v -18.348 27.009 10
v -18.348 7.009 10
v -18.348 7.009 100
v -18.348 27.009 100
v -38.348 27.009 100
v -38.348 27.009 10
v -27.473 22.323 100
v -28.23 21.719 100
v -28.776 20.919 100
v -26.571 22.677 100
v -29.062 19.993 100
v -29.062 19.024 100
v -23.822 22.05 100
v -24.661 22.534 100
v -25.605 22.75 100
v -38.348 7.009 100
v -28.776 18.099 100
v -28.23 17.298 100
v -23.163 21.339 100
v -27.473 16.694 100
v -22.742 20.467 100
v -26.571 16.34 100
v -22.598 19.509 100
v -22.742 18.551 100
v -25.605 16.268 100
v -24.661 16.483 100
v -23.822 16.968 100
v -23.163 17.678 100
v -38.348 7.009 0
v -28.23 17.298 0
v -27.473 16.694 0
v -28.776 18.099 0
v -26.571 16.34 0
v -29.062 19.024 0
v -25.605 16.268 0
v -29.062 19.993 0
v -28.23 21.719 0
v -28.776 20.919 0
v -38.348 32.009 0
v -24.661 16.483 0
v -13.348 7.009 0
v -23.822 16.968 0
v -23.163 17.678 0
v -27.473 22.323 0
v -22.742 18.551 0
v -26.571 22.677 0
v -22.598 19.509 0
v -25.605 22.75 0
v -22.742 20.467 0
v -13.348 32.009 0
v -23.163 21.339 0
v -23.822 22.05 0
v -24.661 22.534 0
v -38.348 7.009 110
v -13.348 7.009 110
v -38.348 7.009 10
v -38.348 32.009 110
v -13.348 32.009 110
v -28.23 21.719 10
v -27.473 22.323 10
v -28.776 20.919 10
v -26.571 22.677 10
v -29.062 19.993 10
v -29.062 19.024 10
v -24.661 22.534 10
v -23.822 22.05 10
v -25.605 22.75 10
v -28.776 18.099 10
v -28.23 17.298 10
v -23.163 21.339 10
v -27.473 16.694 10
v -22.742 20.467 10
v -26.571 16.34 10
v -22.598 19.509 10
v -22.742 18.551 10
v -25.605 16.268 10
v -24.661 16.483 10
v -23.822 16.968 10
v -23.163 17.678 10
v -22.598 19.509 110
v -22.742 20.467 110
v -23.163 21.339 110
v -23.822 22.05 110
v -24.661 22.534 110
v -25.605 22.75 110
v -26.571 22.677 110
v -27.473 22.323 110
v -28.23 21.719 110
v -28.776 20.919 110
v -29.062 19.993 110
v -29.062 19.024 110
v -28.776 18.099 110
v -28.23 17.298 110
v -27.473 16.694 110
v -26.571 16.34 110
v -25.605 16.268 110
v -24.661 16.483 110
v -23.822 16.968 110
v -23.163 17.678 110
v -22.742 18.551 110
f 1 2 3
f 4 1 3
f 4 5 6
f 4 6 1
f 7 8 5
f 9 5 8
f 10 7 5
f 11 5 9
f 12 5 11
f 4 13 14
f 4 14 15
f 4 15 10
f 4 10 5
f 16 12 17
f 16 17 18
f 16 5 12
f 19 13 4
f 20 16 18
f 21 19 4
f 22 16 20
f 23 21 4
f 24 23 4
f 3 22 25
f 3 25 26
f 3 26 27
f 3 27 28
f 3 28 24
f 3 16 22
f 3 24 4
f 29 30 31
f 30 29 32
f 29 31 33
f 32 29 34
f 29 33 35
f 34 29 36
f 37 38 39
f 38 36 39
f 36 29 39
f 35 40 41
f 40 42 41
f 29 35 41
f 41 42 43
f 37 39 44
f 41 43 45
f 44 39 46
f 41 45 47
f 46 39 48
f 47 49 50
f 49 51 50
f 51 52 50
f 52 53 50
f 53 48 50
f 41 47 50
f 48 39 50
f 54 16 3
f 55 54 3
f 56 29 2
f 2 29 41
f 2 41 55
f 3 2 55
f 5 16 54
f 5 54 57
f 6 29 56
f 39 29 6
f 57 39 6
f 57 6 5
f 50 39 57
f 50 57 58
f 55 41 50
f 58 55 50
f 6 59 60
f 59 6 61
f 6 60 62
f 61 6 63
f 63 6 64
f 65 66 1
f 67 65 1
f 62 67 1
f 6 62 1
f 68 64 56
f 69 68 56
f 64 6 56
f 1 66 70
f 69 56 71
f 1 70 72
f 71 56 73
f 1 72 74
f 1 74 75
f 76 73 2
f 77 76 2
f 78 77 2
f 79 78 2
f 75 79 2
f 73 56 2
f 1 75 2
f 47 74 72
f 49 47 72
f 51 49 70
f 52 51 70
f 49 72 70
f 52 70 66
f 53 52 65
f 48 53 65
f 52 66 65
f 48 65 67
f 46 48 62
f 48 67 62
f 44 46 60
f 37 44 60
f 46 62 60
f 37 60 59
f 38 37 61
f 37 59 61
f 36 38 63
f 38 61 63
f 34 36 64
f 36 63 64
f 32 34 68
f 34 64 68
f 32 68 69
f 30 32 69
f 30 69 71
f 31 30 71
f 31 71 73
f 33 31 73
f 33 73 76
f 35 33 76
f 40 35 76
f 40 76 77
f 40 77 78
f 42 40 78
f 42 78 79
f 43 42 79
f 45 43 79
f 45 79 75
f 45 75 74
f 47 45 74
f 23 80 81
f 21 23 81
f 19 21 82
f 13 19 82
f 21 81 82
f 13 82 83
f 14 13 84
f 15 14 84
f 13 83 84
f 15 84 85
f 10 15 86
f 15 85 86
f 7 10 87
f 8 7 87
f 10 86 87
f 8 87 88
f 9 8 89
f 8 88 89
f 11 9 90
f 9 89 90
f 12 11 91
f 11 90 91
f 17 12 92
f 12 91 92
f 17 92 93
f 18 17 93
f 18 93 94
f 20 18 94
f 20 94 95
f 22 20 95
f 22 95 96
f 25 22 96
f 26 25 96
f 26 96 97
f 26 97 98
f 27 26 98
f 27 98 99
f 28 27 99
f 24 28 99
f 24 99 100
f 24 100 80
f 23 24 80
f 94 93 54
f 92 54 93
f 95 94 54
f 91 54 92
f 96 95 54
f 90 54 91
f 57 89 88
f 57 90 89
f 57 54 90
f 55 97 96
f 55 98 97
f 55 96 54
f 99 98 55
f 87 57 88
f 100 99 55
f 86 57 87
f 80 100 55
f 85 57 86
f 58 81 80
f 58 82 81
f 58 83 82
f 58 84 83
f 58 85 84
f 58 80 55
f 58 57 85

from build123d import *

# Parameters (mm, degrees)
F0_W     = 25
F0_H     = 25
F1_DEPTH = 110
F2_W     = 27.421856
F2_H     = 90
F3_DEPTH = 20
F4_R     = 3.25
F5_DEPTH = 110.001


with BuildPart() as f1:
    # F0 (on Top) → F1 (new body)
    with BuildSketch(Plane.XY):
        with Locations((-25.848038, 19.508659)):
            Rectangle(F0_W, F0_H)
    extrude(amount=F1_DEPTH)

    # F2 (on face) → F3 (cut)
    with BuildSketch(Plane.XZ.offset(-7.008659)):
        with Locations((-32.058966, 55)):
            Rectangle(F2_W, F2_H)
    extrude(amount=-F3_DEPTH, mode=Mode.SUBTRACT)

    # F4 (on face) → F5 (cut, through all)
    with BuildSketch(Plane.XY.offset(110)):
        with Locations((-25.848038, 19.508659)):
            Circle(F4_R)
    extrude(amount=-F5_DEPTH, mode=Mode.SUBTRACT)


solid = f1.part
